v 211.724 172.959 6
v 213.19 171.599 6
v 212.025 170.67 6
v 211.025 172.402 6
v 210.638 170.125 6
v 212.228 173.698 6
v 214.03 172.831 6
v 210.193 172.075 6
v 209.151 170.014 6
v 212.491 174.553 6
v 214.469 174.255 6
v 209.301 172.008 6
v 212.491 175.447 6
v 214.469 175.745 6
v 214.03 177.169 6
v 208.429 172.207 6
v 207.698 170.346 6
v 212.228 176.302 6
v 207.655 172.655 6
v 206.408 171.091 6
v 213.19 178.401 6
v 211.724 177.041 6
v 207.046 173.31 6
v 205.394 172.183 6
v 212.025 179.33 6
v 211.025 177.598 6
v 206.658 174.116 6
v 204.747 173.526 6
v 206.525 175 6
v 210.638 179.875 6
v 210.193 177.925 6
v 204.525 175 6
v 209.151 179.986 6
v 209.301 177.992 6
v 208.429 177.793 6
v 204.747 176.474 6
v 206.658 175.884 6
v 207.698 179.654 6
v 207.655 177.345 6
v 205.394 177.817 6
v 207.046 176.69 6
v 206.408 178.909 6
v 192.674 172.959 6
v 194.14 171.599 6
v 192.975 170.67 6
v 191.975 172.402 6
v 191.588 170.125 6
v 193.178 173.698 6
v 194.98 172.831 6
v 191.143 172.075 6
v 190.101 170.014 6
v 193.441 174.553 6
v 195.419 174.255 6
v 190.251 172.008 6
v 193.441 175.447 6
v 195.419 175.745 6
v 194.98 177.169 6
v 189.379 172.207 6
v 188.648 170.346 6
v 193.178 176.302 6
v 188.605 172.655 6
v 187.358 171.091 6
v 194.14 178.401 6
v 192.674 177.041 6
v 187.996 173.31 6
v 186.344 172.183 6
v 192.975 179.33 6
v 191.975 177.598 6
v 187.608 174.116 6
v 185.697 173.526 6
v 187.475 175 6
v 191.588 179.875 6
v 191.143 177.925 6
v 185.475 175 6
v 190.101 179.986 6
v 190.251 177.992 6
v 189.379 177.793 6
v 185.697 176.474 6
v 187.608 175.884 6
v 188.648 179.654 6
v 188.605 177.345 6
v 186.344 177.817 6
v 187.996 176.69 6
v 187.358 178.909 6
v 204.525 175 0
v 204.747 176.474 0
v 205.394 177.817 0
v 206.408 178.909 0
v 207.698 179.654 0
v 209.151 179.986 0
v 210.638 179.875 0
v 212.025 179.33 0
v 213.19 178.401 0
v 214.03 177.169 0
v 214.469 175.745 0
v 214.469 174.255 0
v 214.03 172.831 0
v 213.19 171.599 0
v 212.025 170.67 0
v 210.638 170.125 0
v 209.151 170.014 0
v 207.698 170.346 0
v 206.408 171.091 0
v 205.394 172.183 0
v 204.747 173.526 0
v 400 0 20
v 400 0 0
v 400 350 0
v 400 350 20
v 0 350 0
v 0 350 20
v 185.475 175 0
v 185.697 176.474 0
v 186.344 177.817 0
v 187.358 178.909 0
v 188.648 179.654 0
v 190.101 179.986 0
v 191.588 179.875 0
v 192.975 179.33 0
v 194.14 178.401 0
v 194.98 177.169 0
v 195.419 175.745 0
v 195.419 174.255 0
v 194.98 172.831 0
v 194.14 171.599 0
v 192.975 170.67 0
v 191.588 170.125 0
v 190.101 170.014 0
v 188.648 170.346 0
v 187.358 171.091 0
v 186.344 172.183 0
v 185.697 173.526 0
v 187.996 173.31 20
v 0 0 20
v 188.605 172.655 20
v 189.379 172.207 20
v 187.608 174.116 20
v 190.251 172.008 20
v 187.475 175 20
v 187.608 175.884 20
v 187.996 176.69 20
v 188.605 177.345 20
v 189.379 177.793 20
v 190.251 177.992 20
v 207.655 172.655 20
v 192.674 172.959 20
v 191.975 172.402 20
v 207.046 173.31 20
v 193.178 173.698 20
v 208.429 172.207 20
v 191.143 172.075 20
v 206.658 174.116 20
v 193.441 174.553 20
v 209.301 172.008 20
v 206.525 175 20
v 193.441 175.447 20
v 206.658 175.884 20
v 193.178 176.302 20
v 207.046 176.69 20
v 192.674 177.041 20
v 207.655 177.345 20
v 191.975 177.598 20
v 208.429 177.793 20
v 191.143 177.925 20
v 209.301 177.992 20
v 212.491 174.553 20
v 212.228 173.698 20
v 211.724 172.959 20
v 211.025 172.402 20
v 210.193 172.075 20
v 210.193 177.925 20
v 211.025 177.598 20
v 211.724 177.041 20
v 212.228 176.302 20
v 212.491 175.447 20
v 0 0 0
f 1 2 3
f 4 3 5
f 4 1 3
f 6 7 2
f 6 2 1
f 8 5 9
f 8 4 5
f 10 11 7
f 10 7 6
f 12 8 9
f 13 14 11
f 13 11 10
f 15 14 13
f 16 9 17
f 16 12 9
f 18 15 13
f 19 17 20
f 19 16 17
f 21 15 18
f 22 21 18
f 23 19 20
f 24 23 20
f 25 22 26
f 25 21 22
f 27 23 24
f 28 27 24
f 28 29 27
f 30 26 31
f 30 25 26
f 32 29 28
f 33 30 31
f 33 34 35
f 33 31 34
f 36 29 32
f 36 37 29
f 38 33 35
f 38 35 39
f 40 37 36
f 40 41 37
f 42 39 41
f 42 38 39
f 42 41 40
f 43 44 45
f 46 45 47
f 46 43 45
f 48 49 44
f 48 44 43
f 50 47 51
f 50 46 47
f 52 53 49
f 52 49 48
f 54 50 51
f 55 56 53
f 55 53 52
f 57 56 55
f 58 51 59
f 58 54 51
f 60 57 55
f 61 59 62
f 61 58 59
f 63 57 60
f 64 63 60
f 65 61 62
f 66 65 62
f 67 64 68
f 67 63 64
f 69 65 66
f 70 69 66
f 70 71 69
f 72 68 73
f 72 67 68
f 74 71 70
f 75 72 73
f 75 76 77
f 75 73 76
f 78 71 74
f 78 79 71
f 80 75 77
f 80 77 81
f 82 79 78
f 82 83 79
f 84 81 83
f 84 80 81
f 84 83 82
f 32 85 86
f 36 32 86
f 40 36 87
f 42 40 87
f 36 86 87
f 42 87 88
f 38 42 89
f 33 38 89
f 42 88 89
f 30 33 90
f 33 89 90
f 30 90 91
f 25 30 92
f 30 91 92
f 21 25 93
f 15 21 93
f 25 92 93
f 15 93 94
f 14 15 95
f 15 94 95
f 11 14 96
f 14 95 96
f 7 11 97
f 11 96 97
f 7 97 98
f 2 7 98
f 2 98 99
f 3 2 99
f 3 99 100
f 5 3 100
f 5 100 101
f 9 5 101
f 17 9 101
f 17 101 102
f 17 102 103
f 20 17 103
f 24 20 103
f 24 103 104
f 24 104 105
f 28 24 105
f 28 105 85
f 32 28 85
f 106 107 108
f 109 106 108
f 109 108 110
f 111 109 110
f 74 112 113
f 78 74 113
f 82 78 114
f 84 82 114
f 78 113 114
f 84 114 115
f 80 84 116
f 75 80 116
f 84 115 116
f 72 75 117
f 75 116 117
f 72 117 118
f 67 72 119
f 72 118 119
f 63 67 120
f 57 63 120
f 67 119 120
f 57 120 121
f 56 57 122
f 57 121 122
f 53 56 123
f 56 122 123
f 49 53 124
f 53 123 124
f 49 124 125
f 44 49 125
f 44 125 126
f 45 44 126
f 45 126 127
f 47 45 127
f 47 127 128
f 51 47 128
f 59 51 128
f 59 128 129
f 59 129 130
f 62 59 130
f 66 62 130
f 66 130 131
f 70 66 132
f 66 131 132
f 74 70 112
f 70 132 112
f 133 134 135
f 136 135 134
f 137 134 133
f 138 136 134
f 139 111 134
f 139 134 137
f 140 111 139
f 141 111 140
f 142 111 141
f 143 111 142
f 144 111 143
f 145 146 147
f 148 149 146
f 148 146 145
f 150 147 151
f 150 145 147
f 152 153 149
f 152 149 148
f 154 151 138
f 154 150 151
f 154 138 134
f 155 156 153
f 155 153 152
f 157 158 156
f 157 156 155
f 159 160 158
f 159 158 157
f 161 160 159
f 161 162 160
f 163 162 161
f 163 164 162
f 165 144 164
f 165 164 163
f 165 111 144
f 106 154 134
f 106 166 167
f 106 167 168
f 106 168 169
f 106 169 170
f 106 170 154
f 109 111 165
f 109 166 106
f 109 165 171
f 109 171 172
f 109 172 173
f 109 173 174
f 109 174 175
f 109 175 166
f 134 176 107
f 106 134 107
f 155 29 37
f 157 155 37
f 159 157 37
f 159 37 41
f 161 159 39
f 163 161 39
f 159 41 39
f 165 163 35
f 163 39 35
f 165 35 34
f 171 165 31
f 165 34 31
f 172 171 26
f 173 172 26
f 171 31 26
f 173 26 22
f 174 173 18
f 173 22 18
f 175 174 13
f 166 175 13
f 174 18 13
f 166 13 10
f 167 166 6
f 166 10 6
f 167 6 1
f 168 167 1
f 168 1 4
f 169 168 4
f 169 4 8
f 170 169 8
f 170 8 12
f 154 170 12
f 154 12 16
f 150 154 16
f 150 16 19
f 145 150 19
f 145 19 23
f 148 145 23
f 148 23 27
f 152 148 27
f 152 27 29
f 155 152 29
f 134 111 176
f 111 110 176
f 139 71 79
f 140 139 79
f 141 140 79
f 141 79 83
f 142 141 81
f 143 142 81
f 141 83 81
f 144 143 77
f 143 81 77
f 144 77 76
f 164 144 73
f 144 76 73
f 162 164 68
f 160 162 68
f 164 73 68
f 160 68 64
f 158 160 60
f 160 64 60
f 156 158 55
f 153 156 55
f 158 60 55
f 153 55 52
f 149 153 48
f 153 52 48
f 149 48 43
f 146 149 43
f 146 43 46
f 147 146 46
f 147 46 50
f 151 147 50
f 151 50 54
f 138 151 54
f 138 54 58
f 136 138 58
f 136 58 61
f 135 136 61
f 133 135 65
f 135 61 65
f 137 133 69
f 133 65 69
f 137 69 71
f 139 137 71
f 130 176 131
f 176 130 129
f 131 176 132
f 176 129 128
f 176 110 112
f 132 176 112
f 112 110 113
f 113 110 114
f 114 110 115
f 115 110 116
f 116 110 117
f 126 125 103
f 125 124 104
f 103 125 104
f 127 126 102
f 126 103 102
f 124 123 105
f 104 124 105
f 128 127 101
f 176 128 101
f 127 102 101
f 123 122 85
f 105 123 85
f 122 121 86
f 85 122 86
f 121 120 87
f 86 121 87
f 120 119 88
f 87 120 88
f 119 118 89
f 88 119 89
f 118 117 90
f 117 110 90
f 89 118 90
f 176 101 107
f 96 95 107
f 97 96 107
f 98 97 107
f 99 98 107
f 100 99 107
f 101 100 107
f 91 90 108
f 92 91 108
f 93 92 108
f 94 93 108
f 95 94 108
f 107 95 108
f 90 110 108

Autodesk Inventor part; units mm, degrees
ref_plane "YZ Plane" through (0, 0, 0) normal (1, 0, 0) x (0, 1, 0)
ref_plane "XZ Plane" through (0, 0, 0) normal (0, 1, 0) x (-1, 0, 0)
ref_plane "XY Plane" through (0, 0, 0) normal (0, 0, 1) x (1, 0, 0)
sketch "Sketch1" plane through (0, 0, 0) normal (0, 0, 1) x (1, 0, 0)
  line L0 (0, 0) -> (400, 0)
  line L1 (400, 0) -> (400, 350)
  line L2 (400, 350) -> (0, 350)
  line L3 (0, 350) -> (0, 0)
  dimension "d0" = 400
  dimension "d1" = 350
extrude "Extrusion1" add sketch "Sketch1" along normal blind 20
sketch "Sketch2" plane through (0, 0, 0) normal (0, 0, -1) x (-1, 0, 0)
  circle A0 centre (-190.475, 175) radius 3 projected
  circle A1 centre (-209.525, 175) radius 3 projected
  point P0 (0, 0)
extrude "Extrusion2" cut sketch "Sketch2" against normal blind 20
sketch "Sketch4" plane through (0, 0, 0) normal (0, 0, -1) x (-1, 0, 0)
  circle A0 centre (-190.475, 175) radius 3 construction
  circle A1 centre (-209.525, 175) radius 3 construction
  circle A2 centre (-190.475, 175) radius 5
  circle A3 centre (-209.525, 175) radius 5
  point P0 (0, 0)
  dimension "d10" = 10
  dimension "d11" = 10
extrude "Extrusion4" cut sketch "Sketch4" against normal blind 6
equation "\"d0\" = maxl"
equation "\"d1\" = maxw"
equation "\"d2\" = platft"
equation "\"d4\" = platft"
equation "\"d10\" = bhd"
equation "\"d11\" = bhd"
equation "\"d12\" = bhh"
equation "\"dias\" = 8.8"
equation "\"stra1\" = 9.5"
equation "\"diab2\" = 6"
equation "\"stra\" = 25"
equation "\"db1\" = 6"
equation "\"ds1\" = 5.8"
equation "\"ds2\" = 1.6"
equation "\"ang\" = 120deg"
equation "\"db2\" = 3"
equation "\"diab3\" = 7"
equation "\"diab4\" = 3"
equation "\"dias1\" = 13.4375"
equation "\"dias3\" = 2"
equation "\"dias4\" = 4"
equation "\"t1\" = 3"
equation "\"t2\" = 3"
equation "\"t3\" = 6"
equation "\"t4\" = 6"
equation "\"t5\" = 3"
equation "\"diab1\" = 19"
equation "\"afw\" = 0.2"
equation "\"maxw\" = 350"
equation "\"lcsd\" = 19.05"
equation "\"lcwd1\" = 25"
equation "\"lch1\" = 39"
equation "\"lcwd2\" = 34"
equation "\"lcwd3\" = 43"
equation "\"dia1\" = 6"
equation "\"td\" = 18"
equation "\"bhh\" = 6"
equation "\"bhd\" = 10"
equation "\"spacert\" = 2"
equation "\"sh\" = 31"
equation "\"sw\" = 25"
equation "\"platft\" = 20"
equation "\"pvct\" = 5"
equation "\"dia3\" = 8"
equation "\"dia4\" = 11"
equation "\"tankl\" = 379"
equation "\"play\" = 9"
equation "\"holeh\" = 26"
equation "\"slack\" = 0.5"
equation "\"surroundt\" = 5"
equation "\"play2\" = 3"
equation "\"maxl\" = 400"
equation "\"diaoverflow\" = 25"
equation "\"diawater\" = 25"
equation "\"diacucl\" = 32"
equation "\"diaair\" = 32"
equation "\"diaph\" = 32"
equation "\"diasurroundhole\" = 42"
equation "\"diagrate\" = 12"
equation "\"gratespacing\" = 12.02082"
equation "\"sidedist\" = 13.9375"
equation "\"bottomdist\" = 9.6355"
equation "\"diahcl\" = 32"
equation "\"bracketwtop\" = 6"
equation "\"bracketwbottom\" = 6"
equation "\"nett\" = 1"
equation "\"nethole\" = 16"
equation "\"nettop\" = 7"
equation "\"netside\" = 3.5"
equation "\"netholespacing\" = 2"
equation "\"diaetape\" = 32"
properties part number "platform_top" material "PVC-Piping"
